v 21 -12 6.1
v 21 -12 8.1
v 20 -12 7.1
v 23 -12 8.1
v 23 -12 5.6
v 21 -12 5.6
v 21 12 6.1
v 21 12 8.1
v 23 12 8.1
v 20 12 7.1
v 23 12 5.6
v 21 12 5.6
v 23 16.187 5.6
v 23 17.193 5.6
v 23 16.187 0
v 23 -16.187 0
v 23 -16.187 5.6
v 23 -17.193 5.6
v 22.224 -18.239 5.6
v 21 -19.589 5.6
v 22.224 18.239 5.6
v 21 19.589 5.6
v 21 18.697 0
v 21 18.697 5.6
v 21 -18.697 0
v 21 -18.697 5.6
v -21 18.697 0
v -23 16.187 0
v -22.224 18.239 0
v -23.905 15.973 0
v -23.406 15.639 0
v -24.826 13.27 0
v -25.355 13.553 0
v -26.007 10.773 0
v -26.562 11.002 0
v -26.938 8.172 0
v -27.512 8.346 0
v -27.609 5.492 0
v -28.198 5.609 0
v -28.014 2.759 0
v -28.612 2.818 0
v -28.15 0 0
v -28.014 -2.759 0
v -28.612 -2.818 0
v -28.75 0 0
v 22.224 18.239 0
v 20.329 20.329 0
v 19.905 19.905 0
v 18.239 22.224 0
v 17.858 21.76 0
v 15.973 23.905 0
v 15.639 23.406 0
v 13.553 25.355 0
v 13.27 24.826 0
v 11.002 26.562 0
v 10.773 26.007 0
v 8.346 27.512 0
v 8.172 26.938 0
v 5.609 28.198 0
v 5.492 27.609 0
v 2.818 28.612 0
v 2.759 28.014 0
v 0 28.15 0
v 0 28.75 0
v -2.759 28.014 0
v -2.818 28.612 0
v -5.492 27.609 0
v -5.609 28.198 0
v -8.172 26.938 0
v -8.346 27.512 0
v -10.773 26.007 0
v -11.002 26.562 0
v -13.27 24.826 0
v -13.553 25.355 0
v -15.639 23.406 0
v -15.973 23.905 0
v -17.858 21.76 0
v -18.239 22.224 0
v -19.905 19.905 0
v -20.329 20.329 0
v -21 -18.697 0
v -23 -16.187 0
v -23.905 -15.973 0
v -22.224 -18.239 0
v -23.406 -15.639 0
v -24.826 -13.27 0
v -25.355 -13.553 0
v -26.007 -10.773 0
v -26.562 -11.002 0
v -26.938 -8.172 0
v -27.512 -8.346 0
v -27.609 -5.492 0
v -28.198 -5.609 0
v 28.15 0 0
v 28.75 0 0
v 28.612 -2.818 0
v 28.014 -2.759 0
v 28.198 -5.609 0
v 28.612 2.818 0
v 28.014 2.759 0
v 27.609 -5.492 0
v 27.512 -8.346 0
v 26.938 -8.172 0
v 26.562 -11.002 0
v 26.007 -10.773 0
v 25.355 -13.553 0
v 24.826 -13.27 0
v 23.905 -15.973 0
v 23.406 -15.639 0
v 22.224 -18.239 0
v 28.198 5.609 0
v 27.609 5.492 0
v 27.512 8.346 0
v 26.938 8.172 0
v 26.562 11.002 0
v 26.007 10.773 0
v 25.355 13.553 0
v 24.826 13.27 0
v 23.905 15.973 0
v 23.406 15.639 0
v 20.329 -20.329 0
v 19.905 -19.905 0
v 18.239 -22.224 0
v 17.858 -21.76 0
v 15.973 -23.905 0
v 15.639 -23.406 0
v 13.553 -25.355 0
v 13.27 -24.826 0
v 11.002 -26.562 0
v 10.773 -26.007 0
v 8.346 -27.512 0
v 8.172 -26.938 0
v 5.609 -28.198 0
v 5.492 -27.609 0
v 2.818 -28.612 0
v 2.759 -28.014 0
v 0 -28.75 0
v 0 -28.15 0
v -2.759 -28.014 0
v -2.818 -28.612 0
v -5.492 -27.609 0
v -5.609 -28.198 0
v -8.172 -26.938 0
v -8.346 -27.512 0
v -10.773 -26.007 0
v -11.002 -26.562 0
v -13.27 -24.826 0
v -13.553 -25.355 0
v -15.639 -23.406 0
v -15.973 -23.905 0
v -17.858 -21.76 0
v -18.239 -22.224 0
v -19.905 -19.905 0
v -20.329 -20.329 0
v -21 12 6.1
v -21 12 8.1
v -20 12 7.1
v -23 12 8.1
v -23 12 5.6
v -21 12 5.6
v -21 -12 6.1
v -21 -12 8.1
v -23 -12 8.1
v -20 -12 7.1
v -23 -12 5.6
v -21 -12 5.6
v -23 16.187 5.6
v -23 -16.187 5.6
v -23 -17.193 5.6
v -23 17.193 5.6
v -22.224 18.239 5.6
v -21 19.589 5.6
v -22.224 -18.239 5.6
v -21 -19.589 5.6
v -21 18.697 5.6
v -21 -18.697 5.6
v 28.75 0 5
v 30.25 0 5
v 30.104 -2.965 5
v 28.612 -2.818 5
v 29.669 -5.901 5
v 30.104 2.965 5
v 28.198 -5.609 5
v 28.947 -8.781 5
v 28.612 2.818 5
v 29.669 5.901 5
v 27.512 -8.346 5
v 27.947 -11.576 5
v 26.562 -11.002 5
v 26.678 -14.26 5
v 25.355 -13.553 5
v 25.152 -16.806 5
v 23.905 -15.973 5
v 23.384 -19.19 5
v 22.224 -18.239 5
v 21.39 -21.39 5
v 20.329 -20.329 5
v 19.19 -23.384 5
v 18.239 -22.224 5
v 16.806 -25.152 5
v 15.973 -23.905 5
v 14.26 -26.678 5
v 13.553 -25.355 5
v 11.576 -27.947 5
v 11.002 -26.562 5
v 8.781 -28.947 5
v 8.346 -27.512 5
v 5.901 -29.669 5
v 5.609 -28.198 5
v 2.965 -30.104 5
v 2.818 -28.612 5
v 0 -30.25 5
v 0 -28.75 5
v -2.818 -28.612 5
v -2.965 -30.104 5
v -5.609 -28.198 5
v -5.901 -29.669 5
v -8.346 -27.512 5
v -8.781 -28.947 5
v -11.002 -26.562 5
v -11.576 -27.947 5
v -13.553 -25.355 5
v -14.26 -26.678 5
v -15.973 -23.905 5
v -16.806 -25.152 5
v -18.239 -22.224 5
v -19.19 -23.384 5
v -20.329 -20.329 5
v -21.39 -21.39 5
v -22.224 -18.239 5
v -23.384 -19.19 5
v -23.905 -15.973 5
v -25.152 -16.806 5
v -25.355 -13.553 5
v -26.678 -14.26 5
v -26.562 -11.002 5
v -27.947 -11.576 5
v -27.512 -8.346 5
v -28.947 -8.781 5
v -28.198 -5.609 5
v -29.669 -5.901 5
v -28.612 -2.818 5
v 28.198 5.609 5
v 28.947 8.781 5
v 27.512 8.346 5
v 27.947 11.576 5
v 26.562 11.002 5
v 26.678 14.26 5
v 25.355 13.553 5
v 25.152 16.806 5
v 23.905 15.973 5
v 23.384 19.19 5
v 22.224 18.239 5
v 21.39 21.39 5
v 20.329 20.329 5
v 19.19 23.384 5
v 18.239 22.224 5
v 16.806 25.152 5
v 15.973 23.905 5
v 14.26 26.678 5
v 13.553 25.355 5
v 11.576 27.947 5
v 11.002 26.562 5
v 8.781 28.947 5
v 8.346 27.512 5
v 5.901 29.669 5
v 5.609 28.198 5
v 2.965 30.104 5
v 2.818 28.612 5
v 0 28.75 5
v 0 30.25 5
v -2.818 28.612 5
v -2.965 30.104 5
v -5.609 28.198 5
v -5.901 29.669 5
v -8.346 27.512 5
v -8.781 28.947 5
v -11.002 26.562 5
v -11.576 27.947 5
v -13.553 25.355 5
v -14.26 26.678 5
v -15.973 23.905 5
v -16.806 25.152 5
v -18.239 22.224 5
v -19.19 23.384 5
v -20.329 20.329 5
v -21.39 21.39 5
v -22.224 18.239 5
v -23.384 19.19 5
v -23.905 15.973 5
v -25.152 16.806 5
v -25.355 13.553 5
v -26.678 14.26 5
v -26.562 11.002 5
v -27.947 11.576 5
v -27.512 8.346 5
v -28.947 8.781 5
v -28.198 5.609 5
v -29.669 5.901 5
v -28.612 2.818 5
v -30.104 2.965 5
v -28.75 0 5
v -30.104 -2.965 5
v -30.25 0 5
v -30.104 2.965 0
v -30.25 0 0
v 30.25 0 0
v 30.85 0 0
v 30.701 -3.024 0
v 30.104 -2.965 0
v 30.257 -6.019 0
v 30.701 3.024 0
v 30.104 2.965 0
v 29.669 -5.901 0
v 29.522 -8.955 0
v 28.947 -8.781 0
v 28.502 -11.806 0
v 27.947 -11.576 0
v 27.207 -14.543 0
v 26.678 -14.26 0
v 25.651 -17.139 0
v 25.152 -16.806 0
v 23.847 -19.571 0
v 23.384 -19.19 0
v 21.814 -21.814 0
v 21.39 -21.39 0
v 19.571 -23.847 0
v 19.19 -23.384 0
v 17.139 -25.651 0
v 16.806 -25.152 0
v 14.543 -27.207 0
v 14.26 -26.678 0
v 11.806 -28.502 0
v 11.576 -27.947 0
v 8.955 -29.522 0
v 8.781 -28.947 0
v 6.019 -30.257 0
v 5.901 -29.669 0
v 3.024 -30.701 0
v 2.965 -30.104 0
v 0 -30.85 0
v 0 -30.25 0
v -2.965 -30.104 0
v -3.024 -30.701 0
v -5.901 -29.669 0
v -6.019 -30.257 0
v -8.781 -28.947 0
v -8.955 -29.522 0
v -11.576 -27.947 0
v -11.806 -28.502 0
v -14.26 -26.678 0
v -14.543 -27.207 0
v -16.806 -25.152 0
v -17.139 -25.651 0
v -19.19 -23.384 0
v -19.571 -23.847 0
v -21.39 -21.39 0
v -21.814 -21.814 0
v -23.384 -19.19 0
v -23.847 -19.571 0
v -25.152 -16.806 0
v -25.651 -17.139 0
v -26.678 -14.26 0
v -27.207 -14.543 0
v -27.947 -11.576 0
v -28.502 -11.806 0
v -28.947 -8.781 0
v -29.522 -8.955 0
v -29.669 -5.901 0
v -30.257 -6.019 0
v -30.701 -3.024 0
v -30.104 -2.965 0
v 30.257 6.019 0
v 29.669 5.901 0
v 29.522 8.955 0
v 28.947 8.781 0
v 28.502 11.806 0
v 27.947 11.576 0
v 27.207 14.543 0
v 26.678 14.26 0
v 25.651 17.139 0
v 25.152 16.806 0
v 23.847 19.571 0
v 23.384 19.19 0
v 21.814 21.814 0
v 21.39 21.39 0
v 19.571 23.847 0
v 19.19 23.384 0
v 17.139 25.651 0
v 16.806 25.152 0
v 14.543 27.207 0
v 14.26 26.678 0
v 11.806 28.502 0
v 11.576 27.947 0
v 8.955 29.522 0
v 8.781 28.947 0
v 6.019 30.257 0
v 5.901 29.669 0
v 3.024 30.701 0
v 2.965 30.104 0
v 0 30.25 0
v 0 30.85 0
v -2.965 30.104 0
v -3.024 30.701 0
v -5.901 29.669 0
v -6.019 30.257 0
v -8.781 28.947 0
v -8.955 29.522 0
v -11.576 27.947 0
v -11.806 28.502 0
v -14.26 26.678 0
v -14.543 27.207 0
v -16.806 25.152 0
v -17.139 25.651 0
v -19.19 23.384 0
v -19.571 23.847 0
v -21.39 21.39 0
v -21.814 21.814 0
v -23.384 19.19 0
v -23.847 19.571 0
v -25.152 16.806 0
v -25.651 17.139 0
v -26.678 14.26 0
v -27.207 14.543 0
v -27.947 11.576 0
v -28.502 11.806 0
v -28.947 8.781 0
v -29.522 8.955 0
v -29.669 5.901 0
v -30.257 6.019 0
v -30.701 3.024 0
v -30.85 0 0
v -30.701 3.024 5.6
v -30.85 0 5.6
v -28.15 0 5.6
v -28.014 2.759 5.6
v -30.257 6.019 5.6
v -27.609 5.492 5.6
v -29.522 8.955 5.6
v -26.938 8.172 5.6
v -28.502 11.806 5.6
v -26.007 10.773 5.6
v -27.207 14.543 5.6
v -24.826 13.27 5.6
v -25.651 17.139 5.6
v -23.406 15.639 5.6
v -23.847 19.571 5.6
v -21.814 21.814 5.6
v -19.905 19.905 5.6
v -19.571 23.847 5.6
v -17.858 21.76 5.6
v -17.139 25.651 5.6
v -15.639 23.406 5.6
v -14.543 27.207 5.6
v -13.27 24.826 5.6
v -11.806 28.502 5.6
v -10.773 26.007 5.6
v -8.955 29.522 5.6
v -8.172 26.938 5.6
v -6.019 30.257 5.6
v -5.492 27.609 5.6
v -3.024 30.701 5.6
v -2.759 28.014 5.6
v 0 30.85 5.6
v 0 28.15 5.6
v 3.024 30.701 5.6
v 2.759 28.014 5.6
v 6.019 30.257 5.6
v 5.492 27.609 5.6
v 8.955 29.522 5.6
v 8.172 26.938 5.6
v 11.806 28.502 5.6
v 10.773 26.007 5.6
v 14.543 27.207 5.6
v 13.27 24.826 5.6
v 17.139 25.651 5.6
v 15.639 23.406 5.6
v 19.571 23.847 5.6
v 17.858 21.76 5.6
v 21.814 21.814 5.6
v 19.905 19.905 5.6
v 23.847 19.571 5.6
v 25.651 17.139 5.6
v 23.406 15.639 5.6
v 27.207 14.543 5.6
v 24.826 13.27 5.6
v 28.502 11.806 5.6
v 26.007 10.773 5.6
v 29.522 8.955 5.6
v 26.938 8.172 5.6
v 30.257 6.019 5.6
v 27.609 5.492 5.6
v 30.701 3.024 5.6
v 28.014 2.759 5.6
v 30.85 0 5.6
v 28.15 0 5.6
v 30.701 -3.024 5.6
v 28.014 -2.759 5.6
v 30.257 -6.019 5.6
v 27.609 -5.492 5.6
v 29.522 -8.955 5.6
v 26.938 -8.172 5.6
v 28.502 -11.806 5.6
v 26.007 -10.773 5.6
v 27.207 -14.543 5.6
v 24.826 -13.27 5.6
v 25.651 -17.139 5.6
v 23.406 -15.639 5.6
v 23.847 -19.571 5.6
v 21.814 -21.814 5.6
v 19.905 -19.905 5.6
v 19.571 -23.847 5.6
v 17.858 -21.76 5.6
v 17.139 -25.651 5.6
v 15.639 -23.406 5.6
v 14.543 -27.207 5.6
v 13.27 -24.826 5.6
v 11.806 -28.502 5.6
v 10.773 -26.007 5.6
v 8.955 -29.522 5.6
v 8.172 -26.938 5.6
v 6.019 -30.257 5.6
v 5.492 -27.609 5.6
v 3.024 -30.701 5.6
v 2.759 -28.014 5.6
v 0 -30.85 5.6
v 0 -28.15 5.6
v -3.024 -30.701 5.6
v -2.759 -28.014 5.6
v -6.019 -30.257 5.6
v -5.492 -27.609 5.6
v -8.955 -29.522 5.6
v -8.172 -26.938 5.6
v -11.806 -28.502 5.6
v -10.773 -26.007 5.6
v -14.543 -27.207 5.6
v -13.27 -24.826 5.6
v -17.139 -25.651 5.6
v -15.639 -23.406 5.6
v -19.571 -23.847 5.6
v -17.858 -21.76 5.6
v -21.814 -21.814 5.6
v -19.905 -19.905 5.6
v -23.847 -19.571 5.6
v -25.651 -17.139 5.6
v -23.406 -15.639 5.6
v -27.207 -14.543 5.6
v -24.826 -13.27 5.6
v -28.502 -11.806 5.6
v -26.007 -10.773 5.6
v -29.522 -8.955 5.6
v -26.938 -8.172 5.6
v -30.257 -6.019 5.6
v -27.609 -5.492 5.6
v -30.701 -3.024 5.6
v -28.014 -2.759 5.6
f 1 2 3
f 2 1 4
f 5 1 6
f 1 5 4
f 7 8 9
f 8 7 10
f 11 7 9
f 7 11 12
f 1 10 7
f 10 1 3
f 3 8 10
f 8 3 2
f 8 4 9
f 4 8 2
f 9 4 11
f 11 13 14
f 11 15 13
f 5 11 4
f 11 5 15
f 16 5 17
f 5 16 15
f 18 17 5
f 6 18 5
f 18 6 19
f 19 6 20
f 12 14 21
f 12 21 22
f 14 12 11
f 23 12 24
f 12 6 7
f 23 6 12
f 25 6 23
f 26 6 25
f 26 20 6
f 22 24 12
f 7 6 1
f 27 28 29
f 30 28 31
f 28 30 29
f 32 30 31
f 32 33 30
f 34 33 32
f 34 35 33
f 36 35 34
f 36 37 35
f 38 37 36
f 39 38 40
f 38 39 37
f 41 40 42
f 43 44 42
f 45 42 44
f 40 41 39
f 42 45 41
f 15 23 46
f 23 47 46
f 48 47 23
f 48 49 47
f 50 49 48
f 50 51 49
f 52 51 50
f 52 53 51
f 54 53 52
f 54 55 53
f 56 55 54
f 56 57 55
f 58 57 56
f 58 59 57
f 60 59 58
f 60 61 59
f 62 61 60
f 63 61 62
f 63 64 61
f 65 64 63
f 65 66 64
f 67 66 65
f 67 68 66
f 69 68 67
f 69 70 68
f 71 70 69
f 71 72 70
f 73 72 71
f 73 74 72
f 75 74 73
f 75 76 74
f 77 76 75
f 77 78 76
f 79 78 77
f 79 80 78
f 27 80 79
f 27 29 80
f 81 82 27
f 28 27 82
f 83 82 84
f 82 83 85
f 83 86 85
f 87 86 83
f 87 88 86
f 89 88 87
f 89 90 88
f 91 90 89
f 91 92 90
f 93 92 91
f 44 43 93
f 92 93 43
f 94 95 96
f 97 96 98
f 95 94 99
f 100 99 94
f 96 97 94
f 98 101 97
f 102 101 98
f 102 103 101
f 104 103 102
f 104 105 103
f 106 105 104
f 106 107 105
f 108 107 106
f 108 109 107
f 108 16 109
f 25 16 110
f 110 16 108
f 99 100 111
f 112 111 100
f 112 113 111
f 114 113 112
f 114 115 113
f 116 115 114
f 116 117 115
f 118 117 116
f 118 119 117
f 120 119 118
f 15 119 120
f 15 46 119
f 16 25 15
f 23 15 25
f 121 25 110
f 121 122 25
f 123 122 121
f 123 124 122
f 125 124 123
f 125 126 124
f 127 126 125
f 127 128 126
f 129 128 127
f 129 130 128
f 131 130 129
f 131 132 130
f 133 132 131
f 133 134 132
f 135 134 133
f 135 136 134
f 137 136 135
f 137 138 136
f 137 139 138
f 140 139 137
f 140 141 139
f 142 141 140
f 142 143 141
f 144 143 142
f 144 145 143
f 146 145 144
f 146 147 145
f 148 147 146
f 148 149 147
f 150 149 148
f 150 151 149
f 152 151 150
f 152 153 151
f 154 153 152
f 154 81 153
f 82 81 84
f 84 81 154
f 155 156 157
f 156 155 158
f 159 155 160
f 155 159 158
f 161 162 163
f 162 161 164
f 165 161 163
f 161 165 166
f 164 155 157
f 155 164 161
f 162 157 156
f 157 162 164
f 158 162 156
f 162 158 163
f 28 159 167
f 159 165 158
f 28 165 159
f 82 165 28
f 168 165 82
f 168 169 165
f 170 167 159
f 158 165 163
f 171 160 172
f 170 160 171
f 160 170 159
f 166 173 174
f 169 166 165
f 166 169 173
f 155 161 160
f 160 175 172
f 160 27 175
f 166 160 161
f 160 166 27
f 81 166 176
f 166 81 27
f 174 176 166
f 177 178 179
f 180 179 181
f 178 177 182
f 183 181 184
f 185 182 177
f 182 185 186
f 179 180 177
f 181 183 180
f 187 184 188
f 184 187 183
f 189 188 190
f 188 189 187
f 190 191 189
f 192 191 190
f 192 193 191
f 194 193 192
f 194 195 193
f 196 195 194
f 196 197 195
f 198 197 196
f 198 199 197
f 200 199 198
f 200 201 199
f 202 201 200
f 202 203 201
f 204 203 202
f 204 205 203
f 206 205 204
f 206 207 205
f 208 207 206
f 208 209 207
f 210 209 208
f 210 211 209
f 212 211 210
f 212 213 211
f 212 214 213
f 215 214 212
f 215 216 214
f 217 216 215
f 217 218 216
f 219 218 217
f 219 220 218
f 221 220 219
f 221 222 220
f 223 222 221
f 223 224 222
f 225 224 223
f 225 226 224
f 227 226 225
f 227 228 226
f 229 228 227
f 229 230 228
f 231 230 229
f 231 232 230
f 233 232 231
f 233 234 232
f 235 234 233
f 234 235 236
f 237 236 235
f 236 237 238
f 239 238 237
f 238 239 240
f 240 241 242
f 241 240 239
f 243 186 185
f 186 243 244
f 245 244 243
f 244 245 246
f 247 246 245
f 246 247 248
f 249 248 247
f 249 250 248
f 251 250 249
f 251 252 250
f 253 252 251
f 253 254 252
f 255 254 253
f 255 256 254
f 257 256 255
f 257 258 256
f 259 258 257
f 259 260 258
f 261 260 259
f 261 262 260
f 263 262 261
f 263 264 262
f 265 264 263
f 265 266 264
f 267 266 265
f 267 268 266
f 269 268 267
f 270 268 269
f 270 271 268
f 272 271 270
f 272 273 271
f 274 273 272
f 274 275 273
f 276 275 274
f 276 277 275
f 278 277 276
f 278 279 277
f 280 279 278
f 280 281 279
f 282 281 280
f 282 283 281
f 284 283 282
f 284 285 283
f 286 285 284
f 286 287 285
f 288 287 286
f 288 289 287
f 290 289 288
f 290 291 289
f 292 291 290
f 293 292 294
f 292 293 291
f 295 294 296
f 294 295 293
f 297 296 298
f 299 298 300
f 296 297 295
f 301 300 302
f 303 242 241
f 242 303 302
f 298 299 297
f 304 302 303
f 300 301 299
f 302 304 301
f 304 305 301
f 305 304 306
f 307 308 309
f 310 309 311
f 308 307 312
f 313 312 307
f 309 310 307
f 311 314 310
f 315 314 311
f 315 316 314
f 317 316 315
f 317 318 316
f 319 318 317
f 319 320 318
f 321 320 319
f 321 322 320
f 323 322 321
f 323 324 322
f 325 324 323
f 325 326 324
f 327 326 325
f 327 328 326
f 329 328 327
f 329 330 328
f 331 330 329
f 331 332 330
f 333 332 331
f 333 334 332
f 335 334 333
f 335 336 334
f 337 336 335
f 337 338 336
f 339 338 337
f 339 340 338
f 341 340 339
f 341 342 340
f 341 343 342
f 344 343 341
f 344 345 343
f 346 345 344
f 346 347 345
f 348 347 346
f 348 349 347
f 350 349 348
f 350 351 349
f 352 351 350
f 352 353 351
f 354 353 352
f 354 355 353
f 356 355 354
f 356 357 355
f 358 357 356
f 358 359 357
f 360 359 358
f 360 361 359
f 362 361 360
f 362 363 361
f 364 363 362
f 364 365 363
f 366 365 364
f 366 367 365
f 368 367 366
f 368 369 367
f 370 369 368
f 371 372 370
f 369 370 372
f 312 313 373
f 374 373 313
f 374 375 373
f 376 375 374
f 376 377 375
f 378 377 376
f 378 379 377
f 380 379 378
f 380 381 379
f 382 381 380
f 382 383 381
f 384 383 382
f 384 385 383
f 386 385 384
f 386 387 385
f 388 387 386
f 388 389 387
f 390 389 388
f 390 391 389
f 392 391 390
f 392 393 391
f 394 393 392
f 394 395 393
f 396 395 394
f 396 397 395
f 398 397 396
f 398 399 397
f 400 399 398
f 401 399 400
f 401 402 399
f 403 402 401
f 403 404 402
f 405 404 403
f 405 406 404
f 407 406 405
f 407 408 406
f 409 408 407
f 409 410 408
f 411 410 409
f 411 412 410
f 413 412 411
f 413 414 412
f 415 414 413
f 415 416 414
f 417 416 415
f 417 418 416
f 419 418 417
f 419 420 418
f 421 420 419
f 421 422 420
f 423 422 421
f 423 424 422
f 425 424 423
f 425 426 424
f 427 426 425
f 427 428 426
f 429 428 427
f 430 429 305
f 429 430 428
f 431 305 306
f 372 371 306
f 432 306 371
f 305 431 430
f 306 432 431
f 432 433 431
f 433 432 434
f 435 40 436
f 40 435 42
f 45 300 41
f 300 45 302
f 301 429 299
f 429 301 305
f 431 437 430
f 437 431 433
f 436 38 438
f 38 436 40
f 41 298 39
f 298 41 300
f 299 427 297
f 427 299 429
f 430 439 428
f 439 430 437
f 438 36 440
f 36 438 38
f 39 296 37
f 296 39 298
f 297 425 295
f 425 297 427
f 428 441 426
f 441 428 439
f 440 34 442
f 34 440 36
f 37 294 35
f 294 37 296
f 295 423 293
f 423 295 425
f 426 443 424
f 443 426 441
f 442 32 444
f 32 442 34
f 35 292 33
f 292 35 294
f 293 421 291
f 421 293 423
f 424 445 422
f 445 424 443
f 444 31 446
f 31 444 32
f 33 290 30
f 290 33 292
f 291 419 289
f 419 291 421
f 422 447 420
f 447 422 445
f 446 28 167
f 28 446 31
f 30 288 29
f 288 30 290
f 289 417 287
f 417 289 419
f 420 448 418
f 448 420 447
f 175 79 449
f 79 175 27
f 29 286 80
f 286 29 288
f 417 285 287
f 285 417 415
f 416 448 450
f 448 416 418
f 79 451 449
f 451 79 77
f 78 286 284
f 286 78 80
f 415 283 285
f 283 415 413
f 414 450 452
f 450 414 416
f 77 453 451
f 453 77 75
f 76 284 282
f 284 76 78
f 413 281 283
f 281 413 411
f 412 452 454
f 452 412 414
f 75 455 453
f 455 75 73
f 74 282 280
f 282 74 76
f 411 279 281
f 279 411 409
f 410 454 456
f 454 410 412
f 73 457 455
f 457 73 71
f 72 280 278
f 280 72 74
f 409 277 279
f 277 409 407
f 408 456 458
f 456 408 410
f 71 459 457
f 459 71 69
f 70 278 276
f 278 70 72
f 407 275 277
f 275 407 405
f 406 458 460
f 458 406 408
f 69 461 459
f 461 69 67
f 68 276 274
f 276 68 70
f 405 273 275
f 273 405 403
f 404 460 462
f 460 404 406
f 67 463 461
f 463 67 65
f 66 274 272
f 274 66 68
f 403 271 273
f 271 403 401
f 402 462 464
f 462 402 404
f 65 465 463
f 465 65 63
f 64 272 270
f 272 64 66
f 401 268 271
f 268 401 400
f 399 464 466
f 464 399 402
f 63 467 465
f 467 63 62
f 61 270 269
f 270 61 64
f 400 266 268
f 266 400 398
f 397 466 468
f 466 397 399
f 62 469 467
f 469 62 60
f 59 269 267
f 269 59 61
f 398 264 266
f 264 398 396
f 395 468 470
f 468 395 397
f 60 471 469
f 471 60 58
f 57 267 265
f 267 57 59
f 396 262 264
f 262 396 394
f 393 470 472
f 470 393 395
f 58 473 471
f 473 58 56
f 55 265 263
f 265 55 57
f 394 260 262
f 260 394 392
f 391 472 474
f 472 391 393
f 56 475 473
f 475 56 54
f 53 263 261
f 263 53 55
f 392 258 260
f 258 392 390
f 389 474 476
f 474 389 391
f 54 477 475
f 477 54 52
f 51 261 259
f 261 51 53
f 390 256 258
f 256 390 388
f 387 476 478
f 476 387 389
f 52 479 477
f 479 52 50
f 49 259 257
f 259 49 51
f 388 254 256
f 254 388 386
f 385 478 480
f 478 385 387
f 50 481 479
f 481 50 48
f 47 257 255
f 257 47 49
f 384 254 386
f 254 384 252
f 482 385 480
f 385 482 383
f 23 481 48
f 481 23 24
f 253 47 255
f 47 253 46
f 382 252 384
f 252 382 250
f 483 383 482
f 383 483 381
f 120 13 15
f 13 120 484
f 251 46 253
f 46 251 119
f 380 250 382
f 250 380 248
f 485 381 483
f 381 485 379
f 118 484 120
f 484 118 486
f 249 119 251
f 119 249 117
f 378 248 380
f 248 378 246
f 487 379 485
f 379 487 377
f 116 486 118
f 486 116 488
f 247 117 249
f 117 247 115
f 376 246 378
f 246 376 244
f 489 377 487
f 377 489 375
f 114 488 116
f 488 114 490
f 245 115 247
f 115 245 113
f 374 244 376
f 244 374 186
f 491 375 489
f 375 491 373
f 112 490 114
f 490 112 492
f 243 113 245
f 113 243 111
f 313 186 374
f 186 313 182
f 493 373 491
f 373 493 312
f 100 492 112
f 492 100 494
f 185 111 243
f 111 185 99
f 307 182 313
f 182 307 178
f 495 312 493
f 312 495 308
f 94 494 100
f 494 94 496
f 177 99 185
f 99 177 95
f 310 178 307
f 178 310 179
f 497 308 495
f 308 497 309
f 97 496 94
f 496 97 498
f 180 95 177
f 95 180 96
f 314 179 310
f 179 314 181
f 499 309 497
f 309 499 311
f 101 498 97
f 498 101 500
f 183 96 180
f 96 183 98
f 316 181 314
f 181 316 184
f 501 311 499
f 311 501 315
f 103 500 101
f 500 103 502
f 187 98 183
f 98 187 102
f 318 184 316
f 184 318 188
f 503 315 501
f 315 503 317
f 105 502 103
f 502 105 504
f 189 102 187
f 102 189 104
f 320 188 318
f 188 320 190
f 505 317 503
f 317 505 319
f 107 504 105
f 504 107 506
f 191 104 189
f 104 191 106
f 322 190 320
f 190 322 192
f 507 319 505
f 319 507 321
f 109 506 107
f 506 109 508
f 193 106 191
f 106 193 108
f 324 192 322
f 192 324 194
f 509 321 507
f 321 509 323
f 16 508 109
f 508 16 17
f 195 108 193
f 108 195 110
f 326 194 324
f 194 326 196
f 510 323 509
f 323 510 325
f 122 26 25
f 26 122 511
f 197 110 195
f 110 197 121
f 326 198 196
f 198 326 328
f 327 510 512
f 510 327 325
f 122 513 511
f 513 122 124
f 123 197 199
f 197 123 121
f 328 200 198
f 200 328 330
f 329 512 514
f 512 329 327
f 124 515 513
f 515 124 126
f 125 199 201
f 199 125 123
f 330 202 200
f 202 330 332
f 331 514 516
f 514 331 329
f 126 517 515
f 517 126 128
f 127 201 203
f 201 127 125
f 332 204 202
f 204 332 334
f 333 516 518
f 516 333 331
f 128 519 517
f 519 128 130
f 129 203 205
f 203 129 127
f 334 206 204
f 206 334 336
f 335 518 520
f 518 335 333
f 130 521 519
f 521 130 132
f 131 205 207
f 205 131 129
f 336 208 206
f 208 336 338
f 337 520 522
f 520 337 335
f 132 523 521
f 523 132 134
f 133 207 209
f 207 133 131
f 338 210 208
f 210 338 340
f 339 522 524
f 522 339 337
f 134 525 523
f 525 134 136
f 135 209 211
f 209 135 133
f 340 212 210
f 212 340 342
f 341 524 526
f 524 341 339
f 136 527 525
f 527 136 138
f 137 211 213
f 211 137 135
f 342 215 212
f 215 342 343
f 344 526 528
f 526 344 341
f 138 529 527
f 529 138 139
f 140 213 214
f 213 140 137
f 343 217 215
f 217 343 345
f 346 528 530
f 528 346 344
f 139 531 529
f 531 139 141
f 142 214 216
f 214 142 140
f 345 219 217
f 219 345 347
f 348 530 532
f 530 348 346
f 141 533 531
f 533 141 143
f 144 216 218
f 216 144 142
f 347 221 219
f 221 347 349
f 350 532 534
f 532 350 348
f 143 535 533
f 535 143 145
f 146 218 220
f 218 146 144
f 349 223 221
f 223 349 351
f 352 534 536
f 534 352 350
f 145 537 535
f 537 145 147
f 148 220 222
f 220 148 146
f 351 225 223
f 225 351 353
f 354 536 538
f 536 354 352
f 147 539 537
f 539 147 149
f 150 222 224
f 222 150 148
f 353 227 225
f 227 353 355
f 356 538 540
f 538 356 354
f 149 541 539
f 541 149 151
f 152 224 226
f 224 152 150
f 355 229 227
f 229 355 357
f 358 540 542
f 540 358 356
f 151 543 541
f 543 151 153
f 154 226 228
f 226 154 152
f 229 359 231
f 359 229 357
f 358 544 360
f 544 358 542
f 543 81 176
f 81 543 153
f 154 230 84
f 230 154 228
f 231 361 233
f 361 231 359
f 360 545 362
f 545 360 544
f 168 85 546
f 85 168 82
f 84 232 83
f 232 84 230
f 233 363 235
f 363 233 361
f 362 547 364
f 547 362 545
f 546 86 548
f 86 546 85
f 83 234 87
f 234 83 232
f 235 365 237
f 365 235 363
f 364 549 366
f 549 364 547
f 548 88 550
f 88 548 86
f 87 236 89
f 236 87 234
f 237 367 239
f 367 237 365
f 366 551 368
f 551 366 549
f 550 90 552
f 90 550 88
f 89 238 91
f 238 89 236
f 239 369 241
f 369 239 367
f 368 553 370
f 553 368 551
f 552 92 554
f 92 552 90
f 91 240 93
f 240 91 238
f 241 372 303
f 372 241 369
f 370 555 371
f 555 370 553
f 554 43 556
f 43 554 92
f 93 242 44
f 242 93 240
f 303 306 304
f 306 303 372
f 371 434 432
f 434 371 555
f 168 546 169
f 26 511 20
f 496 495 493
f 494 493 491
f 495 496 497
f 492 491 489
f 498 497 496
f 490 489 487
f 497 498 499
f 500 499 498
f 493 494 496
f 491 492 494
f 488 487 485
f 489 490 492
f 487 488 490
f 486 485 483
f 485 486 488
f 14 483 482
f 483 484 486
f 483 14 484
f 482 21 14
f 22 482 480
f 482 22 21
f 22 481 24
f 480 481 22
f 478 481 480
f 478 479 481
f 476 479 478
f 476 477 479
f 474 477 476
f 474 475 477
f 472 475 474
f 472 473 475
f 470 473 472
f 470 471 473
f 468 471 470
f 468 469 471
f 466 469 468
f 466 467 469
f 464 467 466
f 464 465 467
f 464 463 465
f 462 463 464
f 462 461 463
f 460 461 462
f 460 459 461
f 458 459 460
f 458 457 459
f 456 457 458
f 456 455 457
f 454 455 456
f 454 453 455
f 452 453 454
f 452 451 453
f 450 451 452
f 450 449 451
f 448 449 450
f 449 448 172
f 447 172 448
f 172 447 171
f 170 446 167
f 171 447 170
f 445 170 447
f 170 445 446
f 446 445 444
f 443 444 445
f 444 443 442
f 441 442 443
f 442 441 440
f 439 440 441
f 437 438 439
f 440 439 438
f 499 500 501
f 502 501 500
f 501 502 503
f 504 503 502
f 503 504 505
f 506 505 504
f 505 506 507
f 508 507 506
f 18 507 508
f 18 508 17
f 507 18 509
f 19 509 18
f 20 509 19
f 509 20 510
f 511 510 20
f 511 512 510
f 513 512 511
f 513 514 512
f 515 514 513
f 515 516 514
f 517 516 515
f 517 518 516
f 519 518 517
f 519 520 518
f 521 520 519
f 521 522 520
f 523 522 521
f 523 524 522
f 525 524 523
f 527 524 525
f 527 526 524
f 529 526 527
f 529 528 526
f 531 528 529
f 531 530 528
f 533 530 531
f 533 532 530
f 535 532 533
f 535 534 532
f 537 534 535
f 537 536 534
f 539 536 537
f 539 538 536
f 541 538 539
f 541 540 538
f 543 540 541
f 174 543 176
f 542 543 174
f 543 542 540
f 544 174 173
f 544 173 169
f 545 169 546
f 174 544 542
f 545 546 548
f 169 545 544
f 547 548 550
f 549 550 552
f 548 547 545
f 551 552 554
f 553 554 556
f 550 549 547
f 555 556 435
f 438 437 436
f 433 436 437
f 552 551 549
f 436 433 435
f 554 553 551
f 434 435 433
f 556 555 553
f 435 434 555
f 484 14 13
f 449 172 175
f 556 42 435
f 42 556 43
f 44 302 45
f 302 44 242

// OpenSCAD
$fn = $preview? 16: 64;

stage_width = 42;
bottom_inner_radius = 57.5 / 2;
top_inner_radius = 76.5 / 2;
thickness = 0.6;
depth = 5;

module rail_fence() {
  translate([stage_width / 2 + 2, 0, 0])
    rotate([90, 0, 180])
      linear_extrude(24, center = true)
        translate([0, thickness + depth])
          polygon([[0, 0], [2, 0], [2, 0.5] ,[3, 1.5], [2, 2.5], [0, 2.5]]);
  linear_extrude(thickness + depth)
    intersection() {
      translate([stage_width / 2 + 1, 0])
        square([2, 40], center = true);
      circle(r = bottom_inner_radius);
    }
}

module cup_joiner() {
  slit = 1.5;
  rotate_extrude()
    polygon([
      [bottom_inner_radius - thickness, 0],
      [bottom_inner_radius, 0],
      [bottom_inner_radius, depth],
      [bottom_inner_radius + slit, depth],
      [bottom_inner_radius + slit, 0],
      [bottom_inner_radius + slit + thickness, 0],
      [bottom_inner_radius + slit + thickness, thickness + depth],
      [bottom_inner_radius - thickness, thickness + depth],
    ]);
}

cup_joiner();

rail_fence();

rotate([0, 0, 180]) rail_fence();
